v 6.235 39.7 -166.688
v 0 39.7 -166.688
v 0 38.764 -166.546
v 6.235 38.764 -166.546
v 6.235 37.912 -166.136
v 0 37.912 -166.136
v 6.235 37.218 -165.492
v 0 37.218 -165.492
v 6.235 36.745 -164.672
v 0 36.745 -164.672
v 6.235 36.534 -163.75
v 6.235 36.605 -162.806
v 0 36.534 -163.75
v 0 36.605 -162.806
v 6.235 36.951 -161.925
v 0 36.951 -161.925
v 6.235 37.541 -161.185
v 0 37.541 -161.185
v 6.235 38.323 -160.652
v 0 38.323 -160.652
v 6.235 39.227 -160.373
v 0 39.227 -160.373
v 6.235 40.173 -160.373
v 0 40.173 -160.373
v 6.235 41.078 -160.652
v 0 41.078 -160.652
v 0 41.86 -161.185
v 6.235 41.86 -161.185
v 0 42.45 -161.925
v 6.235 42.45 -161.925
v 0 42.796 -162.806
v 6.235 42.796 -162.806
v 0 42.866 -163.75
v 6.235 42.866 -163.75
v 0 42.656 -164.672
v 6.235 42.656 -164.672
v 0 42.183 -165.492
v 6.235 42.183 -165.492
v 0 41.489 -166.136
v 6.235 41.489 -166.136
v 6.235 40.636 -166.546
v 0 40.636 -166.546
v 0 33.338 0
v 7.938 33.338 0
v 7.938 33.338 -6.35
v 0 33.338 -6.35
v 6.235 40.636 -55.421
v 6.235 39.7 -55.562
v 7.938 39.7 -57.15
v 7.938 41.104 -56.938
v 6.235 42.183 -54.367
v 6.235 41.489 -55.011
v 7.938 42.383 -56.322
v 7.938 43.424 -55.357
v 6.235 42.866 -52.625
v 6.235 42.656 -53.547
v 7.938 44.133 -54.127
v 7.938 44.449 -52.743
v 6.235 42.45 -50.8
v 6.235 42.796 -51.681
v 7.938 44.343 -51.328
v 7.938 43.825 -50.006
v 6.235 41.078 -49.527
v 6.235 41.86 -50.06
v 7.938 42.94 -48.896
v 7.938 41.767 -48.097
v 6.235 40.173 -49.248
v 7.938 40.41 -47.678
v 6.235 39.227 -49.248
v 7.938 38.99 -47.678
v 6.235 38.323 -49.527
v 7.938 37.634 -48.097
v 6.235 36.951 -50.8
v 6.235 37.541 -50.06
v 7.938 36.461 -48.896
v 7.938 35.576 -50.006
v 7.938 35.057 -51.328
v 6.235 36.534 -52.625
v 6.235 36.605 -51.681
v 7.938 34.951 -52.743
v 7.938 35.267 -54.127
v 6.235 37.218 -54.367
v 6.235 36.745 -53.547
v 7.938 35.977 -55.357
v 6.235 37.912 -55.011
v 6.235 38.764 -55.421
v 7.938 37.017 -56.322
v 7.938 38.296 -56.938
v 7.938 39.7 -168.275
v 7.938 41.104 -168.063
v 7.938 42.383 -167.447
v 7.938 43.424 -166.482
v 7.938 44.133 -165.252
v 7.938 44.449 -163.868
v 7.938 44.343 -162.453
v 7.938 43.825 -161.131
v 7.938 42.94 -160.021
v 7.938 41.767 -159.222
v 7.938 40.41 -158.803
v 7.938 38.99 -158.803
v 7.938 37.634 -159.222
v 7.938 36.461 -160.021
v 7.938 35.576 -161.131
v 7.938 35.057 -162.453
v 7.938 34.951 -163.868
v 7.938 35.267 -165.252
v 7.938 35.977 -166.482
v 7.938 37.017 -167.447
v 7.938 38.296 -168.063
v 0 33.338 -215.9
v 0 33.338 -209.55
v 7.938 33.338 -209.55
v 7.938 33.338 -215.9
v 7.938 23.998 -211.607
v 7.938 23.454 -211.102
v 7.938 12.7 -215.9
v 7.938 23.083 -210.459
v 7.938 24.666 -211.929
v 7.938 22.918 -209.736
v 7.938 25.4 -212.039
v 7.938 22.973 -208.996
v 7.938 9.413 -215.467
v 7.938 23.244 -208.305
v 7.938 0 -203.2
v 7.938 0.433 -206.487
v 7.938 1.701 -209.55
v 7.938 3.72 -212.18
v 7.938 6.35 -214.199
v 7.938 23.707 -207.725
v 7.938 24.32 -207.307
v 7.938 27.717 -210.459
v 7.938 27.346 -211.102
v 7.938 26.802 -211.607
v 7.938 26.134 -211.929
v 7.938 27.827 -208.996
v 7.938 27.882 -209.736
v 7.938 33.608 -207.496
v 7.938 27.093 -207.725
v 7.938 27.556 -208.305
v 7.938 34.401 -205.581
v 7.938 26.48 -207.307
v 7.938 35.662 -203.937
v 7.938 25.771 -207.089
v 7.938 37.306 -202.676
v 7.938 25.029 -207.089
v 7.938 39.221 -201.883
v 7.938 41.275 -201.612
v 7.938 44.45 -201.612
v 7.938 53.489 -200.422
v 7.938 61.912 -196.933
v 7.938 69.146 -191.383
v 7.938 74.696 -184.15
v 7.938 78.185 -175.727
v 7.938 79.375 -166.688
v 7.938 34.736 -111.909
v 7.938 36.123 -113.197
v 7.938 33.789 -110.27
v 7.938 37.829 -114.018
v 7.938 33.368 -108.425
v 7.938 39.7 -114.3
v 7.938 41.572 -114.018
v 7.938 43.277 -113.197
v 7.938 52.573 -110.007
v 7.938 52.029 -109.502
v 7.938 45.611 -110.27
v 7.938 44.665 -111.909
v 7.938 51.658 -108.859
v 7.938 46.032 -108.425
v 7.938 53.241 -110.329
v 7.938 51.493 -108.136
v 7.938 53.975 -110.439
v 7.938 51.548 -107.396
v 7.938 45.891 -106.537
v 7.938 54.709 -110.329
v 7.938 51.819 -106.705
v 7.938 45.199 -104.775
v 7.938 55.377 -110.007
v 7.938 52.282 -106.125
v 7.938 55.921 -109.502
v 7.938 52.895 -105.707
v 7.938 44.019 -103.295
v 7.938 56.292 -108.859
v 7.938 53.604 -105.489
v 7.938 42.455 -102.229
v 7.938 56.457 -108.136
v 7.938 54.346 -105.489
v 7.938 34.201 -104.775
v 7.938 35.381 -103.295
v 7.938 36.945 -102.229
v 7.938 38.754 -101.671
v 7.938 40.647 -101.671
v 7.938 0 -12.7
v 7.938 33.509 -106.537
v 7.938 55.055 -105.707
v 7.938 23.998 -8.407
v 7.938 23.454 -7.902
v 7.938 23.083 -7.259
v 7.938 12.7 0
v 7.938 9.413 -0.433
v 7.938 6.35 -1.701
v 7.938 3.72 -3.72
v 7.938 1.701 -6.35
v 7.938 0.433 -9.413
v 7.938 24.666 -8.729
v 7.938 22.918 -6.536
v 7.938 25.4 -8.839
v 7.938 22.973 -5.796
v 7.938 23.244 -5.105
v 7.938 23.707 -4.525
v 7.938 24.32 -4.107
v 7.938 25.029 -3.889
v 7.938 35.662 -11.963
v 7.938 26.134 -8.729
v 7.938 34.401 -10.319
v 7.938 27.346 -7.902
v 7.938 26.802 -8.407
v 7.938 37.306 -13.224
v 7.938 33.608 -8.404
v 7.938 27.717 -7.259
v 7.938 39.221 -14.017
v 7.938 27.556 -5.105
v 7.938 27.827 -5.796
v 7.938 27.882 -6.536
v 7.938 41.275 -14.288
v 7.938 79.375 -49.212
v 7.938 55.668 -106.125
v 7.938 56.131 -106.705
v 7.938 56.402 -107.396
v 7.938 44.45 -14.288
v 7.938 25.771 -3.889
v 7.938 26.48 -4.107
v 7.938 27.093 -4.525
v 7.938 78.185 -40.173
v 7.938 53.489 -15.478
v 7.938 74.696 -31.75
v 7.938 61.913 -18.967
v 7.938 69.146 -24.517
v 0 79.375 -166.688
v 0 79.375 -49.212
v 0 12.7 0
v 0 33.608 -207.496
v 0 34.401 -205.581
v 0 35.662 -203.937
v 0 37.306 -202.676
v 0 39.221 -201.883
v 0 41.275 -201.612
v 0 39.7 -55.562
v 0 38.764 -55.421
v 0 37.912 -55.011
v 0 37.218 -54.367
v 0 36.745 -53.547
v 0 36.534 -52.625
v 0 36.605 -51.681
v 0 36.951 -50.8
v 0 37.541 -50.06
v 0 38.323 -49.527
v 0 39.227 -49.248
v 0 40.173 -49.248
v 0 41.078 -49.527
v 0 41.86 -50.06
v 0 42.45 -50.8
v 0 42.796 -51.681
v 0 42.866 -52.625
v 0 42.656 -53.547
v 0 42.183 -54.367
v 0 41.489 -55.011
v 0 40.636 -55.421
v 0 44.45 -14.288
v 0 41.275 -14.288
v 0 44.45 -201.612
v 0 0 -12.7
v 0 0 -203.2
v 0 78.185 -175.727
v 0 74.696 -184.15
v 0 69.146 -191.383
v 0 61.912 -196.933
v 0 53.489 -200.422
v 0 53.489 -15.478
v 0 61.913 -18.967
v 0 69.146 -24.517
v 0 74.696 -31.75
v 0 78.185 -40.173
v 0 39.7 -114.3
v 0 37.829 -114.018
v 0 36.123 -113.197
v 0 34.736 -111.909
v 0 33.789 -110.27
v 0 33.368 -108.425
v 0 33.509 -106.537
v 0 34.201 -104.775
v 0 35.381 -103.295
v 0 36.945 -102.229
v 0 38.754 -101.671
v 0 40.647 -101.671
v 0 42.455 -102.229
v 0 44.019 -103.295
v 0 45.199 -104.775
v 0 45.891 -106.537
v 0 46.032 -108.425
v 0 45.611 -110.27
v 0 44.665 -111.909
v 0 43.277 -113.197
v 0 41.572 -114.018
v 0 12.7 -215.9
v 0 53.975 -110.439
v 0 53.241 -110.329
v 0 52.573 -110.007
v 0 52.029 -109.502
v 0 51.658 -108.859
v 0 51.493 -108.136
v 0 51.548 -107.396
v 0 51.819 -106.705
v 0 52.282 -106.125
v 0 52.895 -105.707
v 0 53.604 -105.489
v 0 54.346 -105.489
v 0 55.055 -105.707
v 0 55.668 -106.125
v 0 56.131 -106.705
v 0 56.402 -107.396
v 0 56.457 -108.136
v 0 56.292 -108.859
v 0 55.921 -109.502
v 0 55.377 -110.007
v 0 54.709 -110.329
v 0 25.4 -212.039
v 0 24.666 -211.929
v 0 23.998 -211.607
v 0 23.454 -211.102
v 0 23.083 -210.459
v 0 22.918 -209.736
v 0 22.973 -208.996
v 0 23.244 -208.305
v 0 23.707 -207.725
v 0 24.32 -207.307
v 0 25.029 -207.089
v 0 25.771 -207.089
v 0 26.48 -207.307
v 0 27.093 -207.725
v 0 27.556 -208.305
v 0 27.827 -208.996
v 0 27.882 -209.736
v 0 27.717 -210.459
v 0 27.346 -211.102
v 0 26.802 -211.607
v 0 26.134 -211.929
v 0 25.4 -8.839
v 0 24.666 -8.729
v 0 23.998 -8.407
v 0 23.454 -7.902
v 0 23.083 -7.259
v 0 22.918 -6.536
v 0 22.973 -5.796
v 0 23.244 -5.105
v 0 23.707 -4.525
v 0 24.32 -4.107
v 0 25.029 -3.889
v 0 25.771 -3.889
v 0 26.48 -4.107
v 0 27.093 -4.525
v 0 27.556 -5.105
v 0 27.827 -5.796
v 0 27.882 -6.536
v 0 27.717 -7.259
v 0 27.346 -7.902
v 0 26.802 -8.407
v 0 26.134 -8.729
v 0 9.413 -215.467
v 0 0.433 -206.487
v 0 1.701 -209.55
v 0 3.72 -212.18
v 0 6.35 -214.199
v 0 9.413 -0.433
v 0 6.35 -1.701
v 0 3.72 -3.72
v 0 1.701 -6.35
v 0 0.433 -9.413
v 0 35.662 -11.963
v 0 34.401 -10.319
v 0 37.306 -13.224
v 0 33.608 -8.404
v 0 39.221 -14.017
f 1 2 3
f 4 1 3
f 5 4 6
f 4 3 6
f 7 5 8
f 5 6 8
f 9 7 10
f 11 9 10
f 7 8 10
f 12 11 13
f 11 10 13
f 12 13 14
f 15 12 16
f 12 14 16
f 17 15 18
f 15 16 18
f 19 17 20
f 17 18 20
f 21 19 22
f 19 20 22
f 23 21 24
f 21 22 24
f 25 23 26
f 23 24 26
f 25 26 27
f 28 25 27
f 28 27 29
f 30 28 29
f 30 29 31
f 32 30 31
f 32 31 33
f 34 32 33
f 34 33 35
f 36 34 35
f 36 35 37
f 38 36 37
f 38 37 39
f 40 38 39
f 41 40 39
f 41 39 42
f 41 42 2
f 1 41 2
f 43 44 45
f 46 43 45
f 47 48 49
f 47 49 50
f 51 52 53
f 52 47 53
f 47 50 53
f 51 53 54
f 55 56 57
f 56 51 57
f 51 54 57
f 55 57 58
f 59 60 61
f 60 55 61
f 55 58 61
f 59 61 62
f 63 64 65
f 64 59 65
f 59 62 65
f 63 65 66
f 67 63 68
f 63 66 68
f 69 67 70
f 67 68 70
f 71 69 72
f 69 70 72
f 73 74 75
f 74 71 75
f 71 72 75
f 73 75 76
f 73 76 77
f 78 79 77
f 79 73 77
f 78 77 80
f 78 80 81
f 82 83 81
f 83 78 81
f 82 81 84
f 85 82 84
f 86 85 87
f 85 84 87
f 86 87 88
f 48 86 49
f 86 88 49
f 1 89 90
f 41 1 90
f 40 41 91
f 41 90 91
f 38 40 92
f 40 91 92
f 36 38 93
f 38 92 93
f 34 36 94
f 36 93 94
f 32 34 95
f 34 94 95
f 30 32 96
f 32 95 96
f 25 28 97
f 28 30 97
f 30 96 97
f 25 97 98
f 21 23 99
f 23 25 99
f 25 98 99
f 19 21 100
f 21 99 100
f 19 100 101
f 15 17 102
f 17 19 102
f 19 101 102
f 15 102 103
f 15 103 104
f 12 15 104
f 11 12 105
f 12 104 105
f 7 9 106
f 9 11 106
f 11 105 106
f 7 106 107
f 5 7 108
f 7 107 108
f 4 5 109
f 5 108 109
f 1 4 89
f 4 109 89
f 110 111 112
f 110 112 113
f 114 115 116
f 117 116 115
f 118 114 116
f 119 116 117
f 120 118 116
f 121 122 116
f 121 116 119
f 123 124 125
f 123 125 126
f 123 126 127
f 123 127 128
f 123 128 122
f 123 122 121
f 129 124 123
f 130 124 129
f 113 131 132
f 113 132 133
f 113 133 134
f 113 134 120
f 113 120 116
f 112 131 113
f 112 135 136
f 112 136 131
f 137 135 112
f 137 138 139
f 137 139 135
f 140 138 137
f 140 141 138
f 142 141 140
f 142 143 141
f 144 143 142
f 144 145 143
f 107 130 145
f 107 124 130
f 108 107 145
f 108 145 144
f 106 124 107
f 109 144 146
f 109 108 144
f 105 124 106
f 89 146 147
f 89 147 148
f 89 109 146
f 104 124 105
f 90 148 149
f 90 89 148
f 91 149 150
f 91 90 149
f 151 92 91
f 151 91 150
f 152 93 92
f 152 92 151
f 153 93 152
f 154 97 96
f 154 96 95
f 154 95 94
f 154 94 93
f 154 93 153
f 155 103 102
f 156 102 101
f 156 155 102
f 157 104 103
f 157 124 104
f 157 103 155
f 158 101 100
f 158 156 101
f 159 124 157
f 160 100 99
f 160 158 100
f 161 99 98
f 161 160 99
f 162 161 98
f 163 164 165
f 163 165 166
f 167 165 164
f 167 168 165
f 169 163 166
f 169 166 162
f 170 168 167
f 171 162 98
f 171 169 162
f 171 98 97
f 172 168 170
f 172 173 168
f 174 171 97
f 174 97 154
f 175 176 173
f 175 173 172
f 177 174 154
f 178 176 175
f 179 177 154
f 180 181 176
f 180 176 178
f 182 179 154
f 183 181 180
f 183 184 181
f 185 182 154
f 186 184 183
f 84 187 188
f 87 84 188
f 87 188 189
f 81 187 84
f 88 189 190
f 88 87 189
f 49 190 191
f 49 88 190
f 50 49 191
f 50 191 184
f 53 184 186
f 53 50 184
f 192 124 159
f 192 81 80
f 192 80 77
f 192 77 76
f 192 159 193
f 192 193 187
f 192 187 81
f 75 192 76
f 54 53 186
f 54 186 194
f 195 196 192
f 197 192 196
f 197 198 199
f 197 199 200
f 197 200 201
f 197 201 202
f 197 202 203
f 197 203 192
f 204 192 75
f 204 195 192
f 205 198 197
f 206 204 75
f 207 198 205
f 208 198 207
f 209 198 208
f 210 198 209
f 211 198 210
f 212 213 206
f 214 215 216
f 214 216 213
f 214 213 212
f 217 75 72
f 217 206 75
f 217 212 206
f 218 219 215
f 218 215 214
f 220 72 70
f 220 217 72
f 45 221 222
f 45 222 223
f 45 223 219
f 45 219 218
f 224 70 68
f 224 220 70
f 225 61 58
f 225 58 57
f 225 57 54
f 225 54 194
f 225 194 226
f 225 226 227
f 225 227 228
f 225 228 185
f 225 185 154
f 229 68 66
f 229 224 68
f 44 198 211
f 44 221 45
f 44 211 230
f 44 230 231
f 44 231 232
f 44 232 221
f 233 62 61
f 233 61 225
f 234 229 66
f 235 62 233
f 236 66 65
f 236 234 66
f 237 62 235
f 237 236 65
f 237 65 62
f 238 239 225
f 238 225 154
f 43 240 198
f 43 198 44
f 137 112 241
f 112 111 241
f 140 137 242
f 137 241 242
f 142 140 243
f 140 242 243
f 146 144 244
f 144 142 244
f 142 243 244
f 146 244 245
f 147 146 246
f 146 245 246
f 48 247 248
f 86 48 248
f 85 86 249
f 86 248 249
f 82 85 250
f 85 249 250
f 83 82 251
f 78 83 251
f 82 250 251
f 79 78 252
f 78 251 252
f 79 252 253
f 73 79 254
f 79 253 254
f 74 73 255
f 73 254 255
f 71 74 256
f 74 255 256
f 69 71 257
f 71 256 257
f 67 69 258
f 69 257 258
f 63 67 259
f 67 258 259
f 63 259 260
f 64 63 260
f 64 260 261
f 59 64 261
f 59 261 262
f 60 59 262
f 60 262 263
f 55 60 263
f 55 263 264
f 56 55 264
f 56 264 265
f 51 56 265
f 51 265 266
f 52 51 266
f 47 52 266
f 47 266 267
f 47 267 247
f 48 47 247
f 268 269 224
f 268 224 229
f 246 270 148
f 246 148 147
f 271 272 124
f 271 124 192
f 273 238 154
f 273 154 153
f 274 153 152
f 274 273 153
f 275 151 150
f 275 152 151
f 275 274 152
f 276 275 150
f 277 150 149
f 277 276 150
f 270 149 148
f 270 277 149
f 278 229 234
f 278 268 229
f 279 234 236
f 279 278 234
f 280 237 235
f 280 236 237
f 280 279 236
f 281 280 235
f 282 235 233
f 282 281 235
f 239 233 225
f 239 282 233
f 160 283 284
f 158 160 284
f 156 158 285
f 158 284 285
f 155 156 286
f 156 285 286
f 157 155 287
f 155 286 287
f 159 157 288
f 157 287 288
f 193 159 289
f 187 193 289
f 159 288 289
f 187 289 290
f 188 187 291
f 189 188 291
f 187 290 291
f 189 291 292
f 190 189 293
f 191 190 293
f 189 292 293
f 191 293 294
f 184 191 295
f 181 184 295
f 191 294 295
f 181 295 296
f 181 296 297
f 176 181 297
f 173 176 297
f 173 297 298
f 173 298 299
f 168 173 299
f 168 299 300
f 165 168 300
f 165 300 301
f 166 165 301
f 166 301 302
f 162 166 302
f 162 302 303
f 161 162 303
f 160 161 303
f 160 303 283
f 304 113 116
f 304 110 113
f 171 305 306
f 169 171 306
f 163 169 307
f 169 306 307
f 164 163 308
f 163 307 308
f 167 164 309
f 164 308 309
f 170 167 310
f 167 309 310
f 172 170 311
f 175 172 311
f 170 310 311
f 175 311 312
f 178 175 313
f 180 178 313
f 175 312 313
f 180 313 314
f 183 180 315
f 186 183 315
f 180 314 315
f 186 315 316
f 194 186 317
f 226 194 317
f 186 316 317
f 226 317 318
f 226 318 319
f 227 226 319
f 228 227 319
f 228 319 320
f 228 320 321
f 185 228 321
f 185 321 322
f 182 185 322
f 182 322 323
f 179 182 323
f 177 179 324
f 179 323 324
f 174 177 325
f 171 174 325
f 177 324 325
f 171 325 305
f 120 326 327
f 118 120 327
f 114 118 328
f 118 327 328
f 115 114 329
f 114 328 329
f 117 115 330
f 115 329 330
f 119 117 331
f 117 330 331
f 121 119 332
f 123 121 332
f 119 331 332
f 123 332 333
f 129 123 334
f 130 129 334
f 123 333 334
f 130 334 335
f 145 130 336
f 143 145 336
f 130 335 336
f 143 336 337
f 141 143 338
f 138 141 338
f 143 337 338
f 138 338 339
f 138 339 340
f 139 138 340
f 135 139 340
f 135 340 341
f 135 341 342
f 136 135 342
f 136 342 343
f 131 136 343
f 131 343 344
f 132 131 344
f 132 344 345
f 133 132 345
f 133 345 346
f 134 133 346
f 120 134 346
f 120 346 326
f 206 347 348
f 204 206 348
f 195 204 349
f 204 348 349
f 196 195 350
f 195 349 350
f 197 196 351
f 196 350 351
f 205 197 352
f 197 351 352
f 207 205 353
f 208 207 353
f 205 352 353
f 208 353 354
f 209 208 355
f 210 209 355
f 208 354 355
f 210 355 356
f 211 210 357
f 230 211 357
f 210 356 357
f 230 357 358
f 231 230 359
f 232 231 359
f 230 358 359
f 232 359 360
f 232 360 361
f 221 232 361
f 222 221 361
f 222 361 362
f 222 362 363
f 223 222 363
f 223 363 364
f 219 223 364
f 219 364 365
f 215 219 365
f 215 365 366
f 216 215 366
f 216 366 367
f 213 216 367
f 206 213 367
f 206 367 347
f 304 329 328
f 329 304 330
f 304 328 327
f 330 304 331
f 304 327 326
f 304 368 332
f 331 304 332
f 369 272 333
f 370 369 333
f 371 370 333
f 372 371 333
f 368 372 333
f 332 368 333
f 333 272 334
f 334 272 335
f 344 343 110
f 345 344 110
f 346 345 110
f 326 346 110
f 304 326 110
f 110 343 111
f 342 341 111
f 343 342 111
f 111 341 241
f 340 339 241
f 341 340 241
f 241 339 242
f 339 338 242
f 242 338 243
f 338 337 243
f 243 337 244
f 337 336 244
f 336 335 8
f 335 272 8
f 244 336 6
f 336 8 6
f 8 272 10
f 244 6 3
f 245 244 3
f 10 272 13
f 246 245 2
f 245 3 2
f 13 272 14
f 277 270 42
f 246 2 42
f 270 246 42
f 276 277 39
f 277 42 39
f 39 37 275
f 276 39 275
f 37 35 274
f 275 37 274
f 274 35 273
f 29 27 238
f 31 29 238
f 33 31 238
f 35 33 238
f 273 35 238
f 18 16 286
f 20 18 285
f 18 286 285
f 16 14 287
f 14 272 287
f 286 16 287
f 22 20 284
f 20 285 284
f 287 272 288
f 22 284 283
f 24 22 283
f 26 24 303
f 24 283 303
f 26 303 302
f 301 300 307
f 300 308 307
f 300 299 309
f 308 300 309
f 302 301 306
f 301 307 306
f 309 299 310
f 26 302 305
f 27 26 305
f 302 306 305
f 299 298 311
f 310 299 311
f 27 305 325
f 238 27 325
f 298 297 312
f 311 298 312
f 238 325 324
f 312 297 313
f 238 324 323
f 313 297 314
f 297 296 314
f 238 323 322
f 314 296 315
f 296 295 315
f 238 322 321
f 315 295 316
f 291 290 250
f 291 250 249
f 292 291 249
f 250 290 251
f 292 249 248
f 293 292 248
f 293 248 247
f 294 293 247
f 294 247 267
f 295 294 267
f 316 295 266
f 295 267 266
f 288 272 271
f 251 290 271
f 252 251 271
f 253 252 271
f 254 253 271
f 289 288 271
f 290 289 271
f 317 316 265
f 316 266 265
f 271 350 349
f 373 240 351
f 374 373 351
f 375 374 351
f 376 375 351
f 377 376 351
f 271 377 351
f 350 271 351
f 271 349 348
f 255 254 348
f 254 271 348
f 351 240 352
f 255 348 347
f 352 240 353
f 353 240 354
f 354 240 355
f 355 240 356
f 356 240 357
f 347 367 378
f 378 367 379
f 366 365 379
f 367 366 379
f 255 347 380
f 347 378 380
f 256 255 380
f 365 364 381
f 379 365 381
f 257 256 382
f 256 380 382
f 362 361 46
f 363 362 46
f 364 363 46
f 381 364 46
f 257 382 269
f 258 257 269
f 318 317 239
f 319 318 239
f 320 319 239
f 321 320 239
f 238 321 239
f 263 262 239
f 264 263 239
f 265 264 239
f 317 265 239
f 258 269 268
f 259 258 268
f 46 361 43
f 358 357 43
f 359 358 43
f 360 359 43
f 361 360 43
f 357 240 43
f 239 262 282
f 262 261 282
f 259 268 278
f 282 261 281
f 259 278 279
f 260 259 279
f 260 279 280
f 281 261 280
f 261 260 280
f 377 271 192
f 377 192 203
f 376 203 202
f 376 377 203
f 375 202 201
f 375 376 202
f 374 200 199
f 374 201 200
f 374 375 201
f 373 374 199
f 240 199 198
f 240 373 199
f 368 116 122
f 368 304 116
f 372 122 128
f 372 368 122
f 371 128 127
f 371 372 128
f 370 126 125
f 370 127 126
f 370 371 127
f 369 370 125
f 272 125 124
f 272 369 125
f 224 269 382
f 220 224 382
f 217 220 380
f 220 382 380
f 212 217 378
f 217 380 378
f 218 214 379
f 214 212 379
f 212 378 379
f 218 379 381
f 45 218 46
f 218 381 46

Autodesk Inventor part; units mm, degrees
ref_plane "YZ Plane" through (0, 0, 0) normal (1, 0, 0) x (0, 1, 0)
ref_plane "XZ Plane" through (0, 0, 0) normal (0, 1, 0) x (-1, 0, 0)
ref_plane "XY Plane" through (0, 0, 0) normal (0, 0, 1) x (1, 0, 0)
sketch "Sketch1" plane through (0, 0, 0) normal (1, 0, 0) x (0, 1, 0)
  line L0 (12.7, 0) -> (33.3375, 0)
  line L1 (33.3375, -215.9) -> (12.7, -215.9)
  line L2 (0, -203.2) -> (0, -12.7)
  line L3 (41.275, -14.2875) -> (44.45, -14.2875)
  line L4 (79.375, -49.2125) -> (79.375, -166.6875)
  line L5 (44.45, -201.6125) -> (41.275, -201.6125)
  line L6 (0, -210.6276) -> (0, -5.2724)
  line L7 (33.3375, 0) -> (33.3375, -6.35)
  line L8 (33.3375, -209.55) -> (33.3375, -215.9)
  arc A0 (79.375, -49.2125) -> (44.45, -14.2875) centre (44.45, -49.2125) ccw
  arc A1 (44.45, -201.6125) -> (79.375, -166.6875) centre (44.45, -166.6875) ccw
  arc A2 (33.3375, -6.35) -> (41.275, -14.2875) centre (41.275, -6.35) ccw
  arc A3 (41.275, -201.6125) -> (33.3375, -209.55) centre (41.275, -209.55) ccw
  arc A4 (12.7, 0) -> (0, -12.7) centre (12.7, -12.7) ccw
  arc A5 (0, -203.2) -> (12.7, -215.9) centre (12.7, -203.2) ccw
  point P0 (0, 0)
  point P1 (0, -215.9)
  point P2 (79.375, -201.6125)
  point P3 (79.375, -107.95)
  point P4 (33.3375, -107.95)
  dimension "d0" = 215.9
  dimension "d1" = 79.375
  dimension "d2" = 33.3375
  dimension "d3" = 14.2875
  dimension "d4" = 14.2875
  dimension "d5" = 34.925
  dimension "d6" = 34.925
  dimension "d7" = 7.9375
  dimension "d8" = 12.7
  dimension "d9" = 12.7
extrude "Extrusion1" add sketch "Sketch1" along normal blind 7.9375
sketch "Sketch2" plane through (7.9375, 0, 0) normal (1, 0, 0) x (0, 0, -1)
  line L0 (215.9, 12.7) -> (215.9, 33.3375) projected
  line L1 (215.9, 33.3375) -> (209.55, 33.3375) projected
  arc A0 (201.6125, 41.275) -> (209.55, 33.3375) centre (209.55, 41.275) ccw projected
  line L2 (201.6125, 41.275) -> (201.6125, 44.45) projected
  arc A1 (201.6125, 44.45) -> (166.6875, 79.375) centre (166.6875, 44.45) ccw projected
  line L3 (166.6875, 79.375) -> (49.2125, 79.375) projected
  arc A2 (49.2125, 79.375) -> (14.2875, 44.45) centre (49.2125, 44.45) ccw projected
  line L4 (14.2875, 44.45) -> (14.2875, 41.275) projected
  arc A3 (6.35, 33.3375) -> (14.2875, 41.275) centre (6.35, 41.275) ccw projected
  line L5 (6.35, 33.3375) -> (0, 33.3375) projected
  line L6 (0, 33.3375) -> (0, 12.7) projected
  arc A4 (0, 12.7) -> (12.7, 0) centre (12.7, 12.7) ccw projected
  line L7 (12.7, 0) -> (203.2, 0) projected
  arc A5 (203.2, 0) -> (215.9, 12.7) centre (203.2, 12.7) ccw projected
  line L8 (107.95, 79.375) -> (107.95, 0) construction
  point P0 (0, 0)
  point P1 (6.35, 25.4)
  point P2 (52.3875, 39.7002)
  point P3 (107.95, 53.975)
  point P4 (107.95, 39.7002)
  point P5 (209.55, 25.4)
  point P6 (163.5125, 39.7002)
  dimension "d12" = 107.95
  dimension "d13" = 39.7002
  dimension "d15" = 39.7002
  dimension "d16" = 53.975
  dimension "d17" = 52.3875
  dimension "d18" = 6.35
  dimension "d19" = 25.4
sketch "Sketch3" plane through (7.9375, 0, 0) normal (1, 0, 0) x (0, 0, -1)
  line L0 (49.2125, 79.375) -> (166.6875, 79.375) construction
  line L1 (107.95, 79.375) -> (107.95, 0) construction
  point P0 (0, 0)
hole "Hole1" at (7.9375, 39.7002, -107.95) direction (-1, 0, 0) diameter 12.7 depth 25.4 tip angle 118
hole "Hole2" at (7.9375, 53.975, -107.95) direction (-1, 0, 0) diameter 4.9784 depth 25.4 tip angle 118 thread size "1/4-20 UNC" class "2B" standard "ANSI Unified Screw Threads"
hole "Hole3" at (7.9375, 25.4, -6.35) at (7.9375, 25.4, -209.55) direction (-1, 0, 0) diameter 4.9784 depth 25.4 tip angle 118 thread size "1/4-20 UNC" class "2B" standard "ANSI Unified Screw Threads"
hole "Hole4" at (7.9375, 39.7002, -52.3875) at (7.9375, 39.7002, -163.5125) direction (-1, 0, 0) diameter 6.35 depth 25.4 tip angle 118 countersink diameter 9.525 countersink angle 86
properties part number "Base plate"
